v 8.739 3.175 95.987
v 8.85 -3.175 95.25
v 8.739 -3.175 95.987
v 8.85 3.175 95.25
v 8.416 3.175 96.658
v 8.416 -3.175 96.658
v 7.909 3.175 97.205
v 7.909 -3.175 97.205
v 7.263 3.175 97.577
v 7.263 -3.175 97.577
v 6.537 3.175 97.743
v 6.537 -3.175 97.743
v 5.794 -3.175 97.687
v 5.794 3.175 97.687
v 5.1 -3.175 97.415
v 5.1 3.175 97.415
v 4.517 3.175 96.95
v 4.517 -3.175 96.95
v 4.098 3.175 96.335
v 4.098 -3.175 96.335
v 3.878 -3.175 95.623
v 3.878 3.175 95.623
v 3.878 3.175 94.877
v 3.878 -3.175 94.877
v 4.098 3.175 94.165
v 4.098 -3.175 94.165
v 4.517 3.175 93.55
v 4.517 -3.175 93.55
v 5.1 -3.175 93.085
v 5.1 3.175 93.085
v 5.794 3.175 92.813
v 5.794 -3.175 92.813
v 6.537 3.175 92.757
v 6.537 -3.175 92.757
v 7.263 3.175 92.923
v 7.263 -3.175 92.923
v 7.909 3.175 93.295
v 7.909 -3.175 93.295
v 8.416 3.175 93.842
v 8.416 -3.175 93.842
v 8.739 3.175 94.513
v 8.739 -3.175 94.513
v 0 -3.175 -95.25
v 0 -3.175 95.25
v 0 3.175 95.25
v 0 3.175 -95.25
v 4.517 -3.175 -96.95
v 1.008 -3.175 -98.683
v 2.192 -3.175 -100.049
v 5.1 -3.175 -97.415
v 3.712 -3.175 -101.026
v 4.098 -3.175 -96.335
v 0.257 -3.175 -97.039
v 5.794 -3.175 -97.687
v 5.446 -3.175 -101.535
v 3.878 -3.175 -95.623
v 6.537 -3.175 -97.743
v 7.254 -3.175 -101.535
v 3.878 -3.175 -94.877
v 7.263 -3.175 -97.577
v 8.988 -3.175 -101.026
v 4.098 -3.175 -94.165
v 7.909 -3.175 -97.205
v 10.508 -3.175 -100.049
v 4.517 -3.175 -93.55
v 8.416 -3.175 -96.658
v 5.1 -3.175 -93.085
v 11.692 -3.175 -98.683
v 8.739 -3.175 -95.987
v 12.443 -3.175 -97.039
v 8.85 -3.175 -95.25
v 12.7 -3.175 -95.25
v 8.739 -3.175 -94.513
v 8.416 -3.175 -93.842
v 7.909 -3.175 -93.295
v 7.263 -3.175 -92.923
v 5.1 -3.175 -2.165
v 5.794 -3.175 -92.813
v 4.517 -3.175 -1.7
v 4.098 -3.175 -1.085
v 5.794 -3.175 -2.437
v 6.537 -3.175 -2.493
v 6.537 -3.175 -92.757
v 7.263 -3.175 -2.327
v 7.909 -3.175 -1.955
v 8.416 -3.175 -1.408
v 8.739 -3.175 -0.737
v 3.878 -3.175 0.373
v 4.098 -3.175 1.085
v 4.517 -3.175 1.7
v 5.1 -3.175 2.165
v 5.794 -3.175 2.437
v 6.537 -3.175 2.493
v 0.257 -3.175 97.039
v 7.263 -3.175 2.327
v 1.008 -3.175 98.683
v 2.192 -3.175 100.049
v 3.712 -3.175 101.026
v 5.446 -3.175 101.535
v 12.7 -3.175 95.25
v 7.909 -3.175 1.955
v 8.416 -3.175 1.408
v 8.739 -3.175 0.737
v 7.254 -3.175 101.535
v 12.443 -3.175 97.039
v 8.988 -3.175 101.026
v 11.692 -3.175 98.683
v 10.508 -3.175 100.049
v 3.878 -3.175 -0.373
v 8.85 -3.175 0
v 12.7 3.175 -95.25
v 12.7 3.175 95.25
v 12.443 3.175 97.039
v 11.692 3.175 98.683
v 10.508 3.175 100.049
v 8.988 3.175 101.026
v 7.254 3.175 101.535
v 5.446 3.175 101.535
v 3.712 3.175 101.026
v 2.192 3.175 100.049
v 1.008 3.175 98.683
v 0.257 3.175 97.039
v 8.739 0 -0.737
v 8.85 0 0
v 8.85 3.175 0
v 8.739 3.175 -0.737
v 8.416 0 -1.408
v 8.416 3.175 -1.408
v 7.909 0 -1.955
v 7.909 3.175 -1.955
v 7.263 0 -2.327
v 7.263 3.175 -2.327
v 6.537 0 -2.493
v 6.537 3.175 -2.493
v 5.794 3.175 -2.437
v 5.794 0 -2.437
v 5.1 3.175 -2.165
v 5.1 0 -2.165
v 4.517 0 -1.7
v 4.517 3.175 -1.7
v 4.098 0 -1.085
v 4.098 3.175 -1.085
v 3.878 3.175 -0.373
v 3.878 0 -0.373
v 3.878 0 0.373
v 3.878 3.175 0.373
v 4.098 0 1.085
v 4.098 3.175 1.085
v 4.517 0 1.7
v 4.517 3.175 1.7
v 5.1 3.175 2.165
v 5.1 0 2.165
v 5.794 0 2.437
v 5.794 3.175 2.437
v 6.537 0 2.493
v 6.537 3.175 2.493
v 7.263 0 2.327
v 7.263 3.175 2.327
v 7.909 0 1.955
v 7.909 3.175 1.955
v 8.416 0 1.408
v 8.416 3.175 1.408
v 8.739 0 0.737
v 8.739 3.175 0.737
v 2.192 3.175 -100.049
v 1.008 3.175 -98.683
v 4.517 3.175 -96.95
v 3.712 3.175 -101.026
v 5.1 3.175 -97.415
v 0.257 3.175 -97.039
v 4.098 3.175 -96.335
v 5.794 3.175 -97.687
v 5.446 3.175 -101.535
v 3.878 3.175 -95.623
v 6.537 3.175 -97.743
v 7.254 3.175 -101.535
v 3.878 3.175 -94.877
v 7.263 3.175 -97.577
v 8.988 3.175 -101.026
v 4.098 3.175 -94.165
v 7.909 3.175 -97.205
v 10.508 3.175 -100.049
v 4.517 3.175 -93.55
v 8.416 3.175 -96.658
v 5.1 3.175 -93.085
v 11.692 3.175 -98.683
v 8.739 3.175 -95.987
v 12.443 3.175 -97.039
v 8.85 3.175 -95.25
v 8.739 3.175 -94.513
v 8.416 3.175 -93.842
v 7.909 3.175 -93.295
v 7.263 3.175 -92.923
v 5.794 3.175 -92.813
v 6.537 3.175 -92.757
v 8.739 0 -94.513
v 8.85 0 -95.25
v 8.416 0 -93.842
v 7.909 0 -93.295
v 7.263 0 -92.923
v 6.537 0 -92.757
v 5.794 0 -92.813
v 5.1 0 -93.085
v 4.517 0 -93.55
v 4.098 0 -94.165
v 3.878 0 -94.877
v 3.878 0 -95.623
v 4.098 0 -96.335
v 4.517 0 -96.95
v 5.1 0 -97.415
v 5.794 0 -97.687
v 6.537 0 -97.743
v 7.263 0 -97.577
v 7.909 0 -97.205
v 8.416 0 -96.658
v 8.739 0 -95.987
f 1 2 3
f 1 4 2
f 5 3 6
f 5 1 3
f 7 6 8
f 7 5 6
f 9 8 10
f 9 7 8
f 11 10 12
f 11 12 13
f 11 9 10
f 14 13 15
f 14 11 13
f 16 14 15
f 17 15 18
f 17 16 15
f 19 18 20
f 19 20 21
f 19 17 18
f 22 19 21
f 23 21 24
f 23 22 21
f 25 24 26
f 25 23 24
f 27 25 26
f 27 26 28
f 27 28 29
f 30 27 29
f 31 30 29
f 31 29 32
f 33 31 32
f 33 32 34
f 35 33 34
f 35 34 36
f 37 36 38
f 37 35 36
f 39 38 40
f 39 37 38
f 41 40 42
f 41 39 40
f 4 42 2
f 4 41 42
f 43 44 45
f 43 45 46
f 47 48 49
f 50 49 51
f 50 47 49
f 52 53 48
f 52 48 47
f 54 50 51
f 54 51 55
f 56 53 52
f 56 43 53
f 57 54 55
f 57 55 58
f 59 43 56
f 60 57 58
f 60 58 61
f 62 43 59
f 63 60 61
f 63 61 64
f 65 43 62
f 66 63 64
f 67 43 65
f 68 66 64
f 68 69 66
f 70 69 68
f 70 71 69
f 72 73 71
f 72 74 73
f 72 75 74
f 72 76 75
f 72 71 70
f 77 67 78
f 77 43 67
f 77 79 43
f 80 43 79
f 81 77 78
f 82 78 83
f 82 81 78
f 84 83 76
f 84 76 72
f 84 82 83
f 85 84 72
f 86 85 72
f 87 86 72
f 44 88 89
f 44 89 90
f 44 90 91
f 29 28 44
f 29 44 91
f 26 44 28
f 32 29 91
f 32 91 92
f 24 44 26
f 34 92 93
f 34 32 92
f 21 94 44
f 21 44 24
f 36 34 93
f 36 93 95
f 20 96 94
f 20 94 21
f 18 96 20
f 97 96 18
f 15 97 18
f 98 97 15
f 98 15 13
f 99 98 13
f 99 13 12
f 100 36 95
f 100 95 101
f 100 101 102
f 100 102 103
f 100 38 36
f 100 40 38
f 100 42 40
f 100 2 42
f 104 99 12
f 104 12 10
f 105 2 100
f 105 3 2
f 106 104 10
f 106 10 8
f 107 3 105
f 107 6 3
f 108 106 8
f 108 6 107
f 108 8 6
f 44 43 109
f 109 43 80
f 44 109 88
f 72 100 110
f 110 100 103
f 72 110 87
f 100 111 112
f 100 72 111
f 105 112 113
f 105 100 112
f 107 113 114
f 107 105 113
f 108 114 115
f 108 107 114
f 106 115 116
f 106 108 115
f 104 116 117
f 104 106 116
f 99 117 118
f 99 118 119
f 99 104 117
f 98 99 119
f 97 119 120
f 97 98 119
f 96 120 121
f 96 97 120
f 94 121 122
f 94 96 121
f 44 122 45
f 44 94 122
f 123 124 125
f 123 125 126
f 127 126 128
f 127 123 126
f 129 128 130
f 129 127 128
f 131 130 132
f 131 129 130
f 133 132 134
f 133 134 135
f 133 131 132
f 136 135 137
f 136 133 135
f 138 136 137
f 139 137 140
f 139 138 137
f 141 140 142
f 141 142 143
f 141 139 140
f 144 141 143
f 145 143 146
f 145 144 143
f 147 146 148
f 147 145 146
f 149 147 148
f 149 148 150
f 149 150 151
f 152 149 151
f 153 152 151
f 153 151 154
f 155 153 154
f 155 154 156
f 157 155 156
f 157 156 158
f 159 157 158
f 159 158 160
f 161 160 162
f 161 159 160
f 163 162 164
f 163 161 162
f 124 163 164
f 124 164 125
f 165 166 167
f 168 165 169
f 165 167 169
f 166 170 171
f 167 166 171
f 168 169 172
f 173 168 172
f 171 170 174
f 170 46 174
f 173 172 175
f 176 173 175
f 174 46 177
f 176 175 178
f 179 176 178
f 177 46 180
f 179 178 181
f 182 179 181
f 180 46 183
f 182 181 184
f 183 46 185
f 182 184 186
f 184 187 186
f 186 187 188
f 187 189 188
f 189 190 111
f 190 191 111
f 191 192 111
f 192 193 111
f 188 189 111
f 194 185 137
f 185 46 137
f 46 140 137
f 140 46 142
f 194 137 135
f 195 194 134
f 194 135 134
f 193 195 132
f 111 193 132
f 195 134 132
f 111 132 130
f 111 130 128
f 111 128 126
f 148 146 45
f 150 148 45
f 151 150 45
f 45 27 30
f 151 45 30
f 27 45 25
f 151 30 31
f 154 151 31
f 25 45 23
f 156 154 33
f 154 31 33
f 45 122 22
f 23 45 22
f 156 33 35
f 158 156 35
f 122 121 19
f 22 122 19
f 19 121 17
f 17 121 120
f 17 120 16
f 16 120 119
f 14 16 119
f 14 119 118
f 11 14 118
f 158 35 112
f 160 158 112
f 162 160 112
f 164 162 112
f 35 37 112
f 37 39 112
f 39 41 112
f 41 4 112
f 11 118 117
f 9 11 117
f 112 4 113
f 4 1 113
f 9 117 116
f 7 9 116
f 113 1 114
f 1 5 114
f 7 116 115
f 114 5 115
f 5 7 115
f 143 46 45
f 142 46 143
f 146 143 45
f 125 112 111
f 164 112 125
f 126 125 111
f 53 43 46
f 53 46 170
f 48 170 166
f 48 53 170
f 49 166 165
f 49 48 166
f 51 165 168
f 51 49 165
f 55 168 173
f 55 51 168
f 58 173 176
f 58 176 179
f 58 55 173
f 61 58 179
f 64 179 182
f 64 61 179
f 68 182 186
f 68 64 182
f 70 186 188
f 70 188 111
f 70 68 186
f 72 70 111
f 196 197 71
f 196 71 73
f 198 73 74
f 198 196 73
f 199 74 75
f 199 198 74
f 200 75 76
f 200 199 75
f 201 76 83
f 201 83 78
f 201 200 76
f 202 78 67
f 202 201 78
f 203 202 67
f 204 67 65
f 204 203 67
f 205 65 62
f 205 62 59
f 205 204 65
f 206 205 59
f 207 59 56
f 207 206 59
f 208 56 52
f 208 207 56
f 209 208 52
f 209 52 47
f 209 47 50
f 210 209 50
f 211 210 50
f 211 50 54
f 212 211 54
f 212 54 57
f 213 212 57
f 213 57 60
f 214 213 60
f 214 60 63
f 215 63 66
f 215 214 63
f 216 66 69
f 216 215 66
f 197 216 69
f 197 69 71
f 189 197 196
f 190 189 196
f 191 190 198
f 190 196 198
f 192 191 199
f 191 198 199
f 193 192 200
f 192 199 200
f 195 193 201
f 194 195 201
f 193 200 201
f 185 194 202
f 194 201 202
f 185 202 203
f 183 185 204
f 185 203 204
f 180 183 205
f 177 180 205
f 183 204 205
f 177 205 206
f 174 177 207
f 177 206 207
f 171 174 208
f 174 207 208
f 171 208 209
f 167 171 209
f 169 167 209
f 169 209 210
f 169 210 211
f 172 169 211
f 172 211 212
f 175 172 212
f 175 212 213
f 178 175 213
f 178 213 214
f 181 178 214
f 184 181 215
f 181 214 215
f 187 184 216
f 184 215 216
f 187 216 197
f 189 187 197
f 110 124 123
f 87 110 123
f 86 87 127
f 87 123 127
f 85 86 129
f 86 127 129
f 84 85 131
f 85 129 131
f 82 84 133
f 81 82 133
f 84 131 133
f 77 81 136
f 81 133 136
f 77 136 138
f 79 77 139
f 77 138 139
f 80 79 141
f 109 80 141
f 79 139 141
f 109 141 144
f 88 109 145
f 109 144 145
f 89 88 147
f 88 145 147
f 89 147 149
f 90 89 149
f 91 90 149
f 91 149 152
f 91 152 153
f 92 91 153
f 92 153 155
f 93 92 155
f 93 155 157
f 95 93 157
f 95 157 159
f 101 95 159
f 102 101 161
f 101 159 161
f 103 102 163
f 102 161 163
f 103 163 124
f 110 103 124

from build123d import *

# Parameters (mm, degrees)
F0_R     = 2.5
F1_DEPTH = 3.175


with BuildPart() as f1:
    # F0 (on Front) → F1 (new body, symmetric)
    with BuildSketch(Plane.XZ):
        with BuildLine():
            ThreePointArc((12.7, 95.249999), (6.35, 101.600001), (0, 95.249999))
            Line((0, 95.249999), (0, 0))
            Line((0, 0), (3.85, 0))
            ThreePointArc((3.85, 0), (6.35, 2.5), (8.85, 0))
            Line((8.85, 0), (12.7, 0))
            Line((12.7, 0), (12.7, 95.249999))
        make_face()
        with Locations((6.35, 95.250001)):
            Circle(F0_R, mode=Mode.SUBTRACT)
        with BuildLine():
            Line((3.85, 0), (0, 0))
            Line((0, 0), (0, -95.249999))
            ThreePointArc((0, -95.249999), (6.35, -101.599999), (12.7, -95.249999))
            Line((12.7, -95.249999), (12.7, 0))
            Line((12.7, 0), (8.85, 0))
            ThreePointArc((8.85, 0), (6.35, -2.5), (3.85, 0))
        make_face()
        with Locations((6.35, -95.249999)):
            Circle(F0_R, mode=Mode.SUBTRACT)
    extrude(amount=F1_DEPTH, both=True)


solid = f1.part
